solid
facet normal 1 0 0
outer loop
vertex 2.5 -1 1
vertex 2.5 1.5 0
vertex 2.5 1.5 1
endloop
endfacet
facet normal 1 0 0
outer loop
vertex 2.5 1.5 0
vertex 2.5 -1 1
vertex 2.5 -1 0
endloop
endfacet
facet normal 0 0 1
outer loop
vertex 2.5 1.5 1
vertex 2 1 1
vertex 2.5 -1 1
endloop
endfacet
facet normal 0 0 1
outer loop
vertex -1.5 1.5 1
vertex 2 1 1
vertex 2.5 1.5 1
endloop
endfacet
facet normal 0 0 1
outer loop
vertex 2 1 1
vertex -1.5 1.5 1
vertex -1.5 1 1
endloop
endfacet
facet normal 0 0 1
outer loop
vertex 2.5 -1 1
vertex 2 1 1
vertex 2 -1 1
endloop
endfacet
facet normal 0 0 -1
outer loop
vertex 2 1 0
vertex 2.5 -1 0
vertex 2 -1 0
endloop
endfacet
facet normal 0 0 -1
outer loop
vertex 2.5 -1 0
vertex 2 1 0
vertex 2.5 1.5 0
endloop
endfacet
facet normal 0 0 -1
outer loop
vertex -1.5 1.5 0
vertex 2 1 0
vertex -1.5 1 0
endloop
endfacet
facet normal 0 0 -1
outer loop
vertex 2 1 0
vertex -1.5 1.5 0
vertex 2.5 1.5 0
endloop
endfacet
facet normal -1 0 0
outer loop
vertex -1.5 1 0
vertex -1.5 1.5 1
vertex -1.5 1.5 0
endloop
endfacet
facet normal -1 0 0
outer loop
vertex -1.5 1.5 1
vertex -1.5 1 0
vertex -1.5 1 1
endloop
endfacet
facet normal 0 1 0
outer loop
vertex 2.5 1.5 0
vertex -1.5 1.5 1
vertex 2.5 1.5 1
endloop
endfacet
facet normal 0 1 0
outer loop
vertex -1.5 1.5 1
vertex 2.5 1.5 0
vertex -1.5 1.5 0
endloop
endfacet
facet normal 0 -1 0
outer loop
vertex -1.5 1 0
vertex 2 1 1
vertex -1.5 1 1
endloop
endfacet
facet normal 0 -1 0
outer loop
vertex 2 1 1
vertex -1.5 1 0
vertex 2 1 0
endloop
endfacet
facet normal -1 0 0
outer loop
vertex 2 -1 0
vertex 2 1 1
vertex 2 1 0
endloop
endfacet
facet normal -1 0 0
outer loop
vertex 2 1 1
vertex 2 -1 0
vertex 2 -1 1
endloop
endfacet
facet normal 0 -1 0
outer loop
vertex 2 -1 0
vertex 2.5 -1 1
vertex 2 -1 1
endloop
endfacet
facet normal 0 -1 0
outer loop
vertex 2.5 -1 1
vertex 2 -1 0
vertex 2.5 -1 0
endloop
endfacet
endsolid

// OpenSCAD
translate([-1.5
,1,0])
{
    cube([4,0.5,1]);
}
translate([2,-1,0])
{
    cube([0.5,2,1]);
}
